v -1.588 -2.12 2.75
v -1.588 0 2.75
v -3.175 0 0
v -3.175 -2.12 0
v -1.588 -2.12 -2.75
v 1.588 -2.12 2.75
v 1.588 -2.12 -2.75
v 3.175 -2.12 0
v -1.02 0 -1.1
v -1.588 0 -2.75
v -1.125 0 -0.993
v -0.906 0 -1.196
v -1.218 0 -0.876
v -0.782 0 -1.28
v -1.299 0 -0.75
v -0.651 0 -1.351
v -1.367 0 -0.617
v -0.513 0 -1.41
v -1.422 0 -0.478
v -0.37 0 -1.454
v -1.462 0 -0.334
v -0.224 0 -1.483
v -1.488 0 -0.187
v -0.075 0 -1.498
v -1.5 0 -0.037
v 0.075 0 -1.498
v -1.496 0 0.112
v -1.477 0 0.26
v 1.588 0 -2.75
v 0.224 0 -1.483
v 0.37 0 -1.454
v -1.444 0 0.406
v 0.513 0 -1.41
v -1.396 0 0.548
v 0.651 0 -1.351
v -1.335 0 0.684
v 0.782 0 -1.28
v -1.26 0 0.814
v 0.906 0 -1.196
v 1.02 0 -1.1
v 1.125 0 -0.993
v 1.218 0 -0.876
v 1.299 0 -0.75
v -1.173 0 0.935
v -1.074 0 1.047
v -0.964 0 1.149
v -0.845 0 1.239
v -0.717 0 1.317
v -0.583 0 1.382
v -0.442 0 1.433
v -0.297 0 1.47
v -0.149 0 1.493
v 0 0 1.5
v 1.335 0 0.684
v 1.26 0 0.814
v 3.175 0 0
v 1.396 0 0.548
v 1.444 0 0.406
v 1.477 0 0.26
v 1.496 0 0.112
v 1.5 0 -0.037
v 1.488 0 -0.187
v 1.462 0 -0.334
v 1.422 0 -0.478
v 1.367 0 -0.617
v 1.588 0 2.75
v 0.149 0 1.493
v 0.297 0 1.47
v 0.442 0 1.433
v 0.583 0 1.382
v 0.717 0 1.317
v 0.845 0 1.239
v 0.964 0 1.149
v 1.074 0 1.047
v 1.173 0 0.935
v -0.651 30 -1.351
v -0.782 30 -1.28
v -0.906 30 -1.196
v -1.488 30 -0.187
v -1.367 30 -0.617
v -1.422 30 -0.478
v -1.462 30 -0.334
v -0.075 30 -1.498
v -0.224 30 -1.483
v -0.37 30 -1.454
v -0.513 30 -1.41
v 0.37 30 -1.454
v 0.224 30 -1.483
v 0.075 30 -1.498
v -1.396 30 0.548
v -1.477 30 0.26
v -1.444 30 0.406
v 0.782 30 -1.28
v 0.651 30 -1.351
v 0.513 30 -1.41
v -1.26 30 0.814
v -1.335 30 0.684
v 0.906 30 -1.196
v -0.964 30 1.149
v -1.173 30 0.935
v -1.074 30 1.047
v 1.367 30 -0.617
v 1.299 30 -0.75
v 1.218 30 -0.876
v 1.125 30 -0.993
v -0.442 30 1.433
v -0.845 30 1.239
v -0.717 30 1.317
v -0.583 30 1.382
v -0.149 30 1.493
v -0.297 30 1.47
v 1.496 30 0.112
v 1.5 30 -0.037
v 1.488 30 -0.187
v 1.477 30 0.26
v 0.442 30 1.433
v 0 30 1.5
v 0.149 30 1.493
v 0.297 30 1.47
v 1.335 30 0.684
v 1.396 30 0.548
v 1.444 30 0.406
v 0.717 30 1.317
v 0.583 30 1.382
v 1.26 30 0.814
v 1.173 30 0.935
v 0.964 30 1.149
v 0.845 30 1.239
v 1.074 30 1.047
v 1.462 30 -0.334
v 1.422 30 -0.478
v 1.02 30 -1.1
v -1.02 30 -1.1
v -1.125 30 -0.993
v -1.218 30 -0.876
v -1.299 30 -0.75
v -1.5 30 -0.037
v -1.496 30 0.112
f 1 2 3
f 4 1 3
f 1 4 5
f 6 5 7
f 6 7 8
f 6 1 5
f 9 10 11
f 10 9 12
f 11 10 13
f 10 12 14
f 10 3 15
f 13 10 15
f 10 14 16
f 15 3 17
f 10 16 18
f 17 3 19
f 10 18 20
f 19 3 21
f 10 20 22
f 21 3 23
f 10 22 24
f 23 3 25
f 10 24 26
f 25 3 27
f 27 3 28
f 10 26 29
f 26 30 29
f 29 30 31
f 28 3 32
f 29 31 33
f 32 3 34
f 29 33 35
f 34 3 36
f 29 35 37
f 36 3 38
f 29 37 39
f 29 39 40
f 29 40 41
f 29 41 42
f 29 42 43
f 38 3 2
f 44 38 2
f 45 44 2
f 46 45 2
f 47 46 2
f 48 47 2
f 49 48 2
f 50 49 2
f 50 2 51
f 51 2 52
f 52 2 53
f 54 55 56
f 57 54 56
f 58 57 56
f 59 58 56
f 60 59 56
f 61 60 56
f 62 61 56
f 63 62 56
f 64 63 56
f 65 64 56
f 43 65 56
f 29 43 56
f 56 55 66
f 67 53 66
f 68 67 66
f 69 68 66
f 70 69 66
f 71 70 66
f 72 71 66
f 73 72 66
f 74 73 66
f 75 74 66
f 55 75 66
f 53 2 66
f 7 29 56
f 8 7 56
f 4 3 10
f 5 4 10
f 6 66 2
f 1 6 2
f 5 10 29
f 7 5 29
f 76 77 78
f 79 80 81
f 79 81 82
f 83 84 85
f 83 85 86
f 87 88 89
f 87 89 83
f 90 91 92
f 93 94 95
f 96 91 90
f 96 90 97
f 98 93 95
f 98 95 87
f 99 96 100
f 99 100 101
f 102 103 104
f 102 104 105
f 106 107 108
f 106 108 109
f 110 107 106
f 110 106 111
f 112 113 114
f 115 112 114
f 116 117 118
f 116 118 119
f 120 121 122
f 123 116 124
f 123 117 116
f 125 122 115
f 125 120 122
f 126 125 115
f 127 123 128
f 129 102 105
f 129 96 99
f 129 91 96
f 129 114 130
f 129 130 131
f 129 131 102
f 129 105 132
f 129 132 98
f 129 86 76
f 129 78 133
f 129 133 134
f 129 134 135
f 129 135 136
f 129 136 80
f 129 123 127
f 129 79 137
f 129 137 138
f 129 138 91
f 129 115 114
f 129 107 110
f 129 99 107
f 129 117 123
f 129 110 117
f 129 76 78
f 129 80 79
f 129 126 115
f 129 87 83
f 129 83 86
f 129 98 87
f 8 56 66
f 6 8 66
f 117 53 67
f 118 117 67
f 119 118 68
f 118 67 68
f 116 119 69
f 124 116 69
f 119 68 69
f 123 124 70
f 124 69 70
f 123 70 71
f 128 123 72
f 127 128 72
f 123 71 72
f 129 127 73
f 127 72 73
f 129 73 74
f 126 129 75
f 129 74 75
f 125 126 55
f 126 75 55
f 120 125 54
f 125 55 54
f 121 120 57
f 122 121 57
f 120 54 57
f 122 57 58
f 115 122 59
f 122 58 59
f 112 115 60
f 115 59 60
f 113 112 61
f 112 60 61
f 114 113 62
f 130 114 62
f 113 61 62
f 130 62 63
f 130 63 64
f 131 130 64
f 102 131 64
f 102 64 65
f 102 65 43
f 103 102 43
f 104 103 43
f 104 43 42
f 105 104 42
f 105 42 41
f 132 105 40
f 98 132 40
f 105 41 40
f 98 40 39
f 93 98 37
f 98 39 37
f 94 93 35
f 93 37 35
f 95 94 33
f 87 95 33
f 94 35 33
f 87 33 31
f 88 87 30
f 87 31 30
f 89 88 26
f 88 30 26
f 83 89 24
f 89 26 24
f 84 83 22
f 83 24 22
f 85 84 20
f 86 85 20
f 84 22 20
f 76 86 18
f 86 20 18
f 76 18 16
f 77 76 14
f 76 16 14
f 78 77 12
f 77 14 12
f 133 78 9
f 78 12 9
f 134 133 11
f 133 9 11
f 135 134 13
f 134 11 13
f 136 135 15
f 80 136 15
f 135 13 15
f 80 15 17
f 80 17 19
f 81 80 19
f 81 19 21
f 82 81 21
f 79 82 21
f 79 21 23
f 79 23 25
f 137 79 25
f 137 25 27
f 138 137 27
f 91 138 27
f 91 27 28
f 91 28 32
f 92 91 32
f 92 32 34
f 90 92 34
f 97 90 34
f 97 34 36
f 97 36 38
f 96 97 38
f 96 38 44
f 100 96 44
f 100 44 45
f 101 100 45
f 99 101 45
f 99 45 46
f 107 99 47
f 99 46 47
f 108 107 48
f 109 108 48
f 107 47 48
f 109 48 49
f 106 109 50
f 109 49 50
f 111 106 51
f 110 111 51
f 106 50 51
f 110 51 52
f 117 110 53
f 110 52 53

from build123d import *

# Parameters (mm, degrees)
SKETCH_1_R      = 1.5
EXTRUDE_1_DEPTH = 30
EXTRUDE_2_DEPTH = 2.12


with BuildPart() as part:
    # 草图1 → 凸台-拉伸1 (new body)
    with BuildSketch(Plane(origin=(0, 0, 0), x_dir=(1, 0, 0), z_dir=(0, 1, 0))):
        with Locations(Location((0, 0, 0), (0, 0, 270))):
            Circle(SKETCH_1_R)
    extrude(amount=EXTRUDE_1_DEPTH)

    # 草图3 → 凸台-拉伸2 (add)
    with BuildSketch(Plane.XZ):
        Polygon((3.175426481, 0), (1.58771324, 2.75), (-1.58771324, 2.75), (-3.175426481, 0), (-1.58771324, -2.75), (1.58771324, -2.75), align=None)
    extrude(amount=EXTRUDE_2_DEPTH)


solid = part.part
